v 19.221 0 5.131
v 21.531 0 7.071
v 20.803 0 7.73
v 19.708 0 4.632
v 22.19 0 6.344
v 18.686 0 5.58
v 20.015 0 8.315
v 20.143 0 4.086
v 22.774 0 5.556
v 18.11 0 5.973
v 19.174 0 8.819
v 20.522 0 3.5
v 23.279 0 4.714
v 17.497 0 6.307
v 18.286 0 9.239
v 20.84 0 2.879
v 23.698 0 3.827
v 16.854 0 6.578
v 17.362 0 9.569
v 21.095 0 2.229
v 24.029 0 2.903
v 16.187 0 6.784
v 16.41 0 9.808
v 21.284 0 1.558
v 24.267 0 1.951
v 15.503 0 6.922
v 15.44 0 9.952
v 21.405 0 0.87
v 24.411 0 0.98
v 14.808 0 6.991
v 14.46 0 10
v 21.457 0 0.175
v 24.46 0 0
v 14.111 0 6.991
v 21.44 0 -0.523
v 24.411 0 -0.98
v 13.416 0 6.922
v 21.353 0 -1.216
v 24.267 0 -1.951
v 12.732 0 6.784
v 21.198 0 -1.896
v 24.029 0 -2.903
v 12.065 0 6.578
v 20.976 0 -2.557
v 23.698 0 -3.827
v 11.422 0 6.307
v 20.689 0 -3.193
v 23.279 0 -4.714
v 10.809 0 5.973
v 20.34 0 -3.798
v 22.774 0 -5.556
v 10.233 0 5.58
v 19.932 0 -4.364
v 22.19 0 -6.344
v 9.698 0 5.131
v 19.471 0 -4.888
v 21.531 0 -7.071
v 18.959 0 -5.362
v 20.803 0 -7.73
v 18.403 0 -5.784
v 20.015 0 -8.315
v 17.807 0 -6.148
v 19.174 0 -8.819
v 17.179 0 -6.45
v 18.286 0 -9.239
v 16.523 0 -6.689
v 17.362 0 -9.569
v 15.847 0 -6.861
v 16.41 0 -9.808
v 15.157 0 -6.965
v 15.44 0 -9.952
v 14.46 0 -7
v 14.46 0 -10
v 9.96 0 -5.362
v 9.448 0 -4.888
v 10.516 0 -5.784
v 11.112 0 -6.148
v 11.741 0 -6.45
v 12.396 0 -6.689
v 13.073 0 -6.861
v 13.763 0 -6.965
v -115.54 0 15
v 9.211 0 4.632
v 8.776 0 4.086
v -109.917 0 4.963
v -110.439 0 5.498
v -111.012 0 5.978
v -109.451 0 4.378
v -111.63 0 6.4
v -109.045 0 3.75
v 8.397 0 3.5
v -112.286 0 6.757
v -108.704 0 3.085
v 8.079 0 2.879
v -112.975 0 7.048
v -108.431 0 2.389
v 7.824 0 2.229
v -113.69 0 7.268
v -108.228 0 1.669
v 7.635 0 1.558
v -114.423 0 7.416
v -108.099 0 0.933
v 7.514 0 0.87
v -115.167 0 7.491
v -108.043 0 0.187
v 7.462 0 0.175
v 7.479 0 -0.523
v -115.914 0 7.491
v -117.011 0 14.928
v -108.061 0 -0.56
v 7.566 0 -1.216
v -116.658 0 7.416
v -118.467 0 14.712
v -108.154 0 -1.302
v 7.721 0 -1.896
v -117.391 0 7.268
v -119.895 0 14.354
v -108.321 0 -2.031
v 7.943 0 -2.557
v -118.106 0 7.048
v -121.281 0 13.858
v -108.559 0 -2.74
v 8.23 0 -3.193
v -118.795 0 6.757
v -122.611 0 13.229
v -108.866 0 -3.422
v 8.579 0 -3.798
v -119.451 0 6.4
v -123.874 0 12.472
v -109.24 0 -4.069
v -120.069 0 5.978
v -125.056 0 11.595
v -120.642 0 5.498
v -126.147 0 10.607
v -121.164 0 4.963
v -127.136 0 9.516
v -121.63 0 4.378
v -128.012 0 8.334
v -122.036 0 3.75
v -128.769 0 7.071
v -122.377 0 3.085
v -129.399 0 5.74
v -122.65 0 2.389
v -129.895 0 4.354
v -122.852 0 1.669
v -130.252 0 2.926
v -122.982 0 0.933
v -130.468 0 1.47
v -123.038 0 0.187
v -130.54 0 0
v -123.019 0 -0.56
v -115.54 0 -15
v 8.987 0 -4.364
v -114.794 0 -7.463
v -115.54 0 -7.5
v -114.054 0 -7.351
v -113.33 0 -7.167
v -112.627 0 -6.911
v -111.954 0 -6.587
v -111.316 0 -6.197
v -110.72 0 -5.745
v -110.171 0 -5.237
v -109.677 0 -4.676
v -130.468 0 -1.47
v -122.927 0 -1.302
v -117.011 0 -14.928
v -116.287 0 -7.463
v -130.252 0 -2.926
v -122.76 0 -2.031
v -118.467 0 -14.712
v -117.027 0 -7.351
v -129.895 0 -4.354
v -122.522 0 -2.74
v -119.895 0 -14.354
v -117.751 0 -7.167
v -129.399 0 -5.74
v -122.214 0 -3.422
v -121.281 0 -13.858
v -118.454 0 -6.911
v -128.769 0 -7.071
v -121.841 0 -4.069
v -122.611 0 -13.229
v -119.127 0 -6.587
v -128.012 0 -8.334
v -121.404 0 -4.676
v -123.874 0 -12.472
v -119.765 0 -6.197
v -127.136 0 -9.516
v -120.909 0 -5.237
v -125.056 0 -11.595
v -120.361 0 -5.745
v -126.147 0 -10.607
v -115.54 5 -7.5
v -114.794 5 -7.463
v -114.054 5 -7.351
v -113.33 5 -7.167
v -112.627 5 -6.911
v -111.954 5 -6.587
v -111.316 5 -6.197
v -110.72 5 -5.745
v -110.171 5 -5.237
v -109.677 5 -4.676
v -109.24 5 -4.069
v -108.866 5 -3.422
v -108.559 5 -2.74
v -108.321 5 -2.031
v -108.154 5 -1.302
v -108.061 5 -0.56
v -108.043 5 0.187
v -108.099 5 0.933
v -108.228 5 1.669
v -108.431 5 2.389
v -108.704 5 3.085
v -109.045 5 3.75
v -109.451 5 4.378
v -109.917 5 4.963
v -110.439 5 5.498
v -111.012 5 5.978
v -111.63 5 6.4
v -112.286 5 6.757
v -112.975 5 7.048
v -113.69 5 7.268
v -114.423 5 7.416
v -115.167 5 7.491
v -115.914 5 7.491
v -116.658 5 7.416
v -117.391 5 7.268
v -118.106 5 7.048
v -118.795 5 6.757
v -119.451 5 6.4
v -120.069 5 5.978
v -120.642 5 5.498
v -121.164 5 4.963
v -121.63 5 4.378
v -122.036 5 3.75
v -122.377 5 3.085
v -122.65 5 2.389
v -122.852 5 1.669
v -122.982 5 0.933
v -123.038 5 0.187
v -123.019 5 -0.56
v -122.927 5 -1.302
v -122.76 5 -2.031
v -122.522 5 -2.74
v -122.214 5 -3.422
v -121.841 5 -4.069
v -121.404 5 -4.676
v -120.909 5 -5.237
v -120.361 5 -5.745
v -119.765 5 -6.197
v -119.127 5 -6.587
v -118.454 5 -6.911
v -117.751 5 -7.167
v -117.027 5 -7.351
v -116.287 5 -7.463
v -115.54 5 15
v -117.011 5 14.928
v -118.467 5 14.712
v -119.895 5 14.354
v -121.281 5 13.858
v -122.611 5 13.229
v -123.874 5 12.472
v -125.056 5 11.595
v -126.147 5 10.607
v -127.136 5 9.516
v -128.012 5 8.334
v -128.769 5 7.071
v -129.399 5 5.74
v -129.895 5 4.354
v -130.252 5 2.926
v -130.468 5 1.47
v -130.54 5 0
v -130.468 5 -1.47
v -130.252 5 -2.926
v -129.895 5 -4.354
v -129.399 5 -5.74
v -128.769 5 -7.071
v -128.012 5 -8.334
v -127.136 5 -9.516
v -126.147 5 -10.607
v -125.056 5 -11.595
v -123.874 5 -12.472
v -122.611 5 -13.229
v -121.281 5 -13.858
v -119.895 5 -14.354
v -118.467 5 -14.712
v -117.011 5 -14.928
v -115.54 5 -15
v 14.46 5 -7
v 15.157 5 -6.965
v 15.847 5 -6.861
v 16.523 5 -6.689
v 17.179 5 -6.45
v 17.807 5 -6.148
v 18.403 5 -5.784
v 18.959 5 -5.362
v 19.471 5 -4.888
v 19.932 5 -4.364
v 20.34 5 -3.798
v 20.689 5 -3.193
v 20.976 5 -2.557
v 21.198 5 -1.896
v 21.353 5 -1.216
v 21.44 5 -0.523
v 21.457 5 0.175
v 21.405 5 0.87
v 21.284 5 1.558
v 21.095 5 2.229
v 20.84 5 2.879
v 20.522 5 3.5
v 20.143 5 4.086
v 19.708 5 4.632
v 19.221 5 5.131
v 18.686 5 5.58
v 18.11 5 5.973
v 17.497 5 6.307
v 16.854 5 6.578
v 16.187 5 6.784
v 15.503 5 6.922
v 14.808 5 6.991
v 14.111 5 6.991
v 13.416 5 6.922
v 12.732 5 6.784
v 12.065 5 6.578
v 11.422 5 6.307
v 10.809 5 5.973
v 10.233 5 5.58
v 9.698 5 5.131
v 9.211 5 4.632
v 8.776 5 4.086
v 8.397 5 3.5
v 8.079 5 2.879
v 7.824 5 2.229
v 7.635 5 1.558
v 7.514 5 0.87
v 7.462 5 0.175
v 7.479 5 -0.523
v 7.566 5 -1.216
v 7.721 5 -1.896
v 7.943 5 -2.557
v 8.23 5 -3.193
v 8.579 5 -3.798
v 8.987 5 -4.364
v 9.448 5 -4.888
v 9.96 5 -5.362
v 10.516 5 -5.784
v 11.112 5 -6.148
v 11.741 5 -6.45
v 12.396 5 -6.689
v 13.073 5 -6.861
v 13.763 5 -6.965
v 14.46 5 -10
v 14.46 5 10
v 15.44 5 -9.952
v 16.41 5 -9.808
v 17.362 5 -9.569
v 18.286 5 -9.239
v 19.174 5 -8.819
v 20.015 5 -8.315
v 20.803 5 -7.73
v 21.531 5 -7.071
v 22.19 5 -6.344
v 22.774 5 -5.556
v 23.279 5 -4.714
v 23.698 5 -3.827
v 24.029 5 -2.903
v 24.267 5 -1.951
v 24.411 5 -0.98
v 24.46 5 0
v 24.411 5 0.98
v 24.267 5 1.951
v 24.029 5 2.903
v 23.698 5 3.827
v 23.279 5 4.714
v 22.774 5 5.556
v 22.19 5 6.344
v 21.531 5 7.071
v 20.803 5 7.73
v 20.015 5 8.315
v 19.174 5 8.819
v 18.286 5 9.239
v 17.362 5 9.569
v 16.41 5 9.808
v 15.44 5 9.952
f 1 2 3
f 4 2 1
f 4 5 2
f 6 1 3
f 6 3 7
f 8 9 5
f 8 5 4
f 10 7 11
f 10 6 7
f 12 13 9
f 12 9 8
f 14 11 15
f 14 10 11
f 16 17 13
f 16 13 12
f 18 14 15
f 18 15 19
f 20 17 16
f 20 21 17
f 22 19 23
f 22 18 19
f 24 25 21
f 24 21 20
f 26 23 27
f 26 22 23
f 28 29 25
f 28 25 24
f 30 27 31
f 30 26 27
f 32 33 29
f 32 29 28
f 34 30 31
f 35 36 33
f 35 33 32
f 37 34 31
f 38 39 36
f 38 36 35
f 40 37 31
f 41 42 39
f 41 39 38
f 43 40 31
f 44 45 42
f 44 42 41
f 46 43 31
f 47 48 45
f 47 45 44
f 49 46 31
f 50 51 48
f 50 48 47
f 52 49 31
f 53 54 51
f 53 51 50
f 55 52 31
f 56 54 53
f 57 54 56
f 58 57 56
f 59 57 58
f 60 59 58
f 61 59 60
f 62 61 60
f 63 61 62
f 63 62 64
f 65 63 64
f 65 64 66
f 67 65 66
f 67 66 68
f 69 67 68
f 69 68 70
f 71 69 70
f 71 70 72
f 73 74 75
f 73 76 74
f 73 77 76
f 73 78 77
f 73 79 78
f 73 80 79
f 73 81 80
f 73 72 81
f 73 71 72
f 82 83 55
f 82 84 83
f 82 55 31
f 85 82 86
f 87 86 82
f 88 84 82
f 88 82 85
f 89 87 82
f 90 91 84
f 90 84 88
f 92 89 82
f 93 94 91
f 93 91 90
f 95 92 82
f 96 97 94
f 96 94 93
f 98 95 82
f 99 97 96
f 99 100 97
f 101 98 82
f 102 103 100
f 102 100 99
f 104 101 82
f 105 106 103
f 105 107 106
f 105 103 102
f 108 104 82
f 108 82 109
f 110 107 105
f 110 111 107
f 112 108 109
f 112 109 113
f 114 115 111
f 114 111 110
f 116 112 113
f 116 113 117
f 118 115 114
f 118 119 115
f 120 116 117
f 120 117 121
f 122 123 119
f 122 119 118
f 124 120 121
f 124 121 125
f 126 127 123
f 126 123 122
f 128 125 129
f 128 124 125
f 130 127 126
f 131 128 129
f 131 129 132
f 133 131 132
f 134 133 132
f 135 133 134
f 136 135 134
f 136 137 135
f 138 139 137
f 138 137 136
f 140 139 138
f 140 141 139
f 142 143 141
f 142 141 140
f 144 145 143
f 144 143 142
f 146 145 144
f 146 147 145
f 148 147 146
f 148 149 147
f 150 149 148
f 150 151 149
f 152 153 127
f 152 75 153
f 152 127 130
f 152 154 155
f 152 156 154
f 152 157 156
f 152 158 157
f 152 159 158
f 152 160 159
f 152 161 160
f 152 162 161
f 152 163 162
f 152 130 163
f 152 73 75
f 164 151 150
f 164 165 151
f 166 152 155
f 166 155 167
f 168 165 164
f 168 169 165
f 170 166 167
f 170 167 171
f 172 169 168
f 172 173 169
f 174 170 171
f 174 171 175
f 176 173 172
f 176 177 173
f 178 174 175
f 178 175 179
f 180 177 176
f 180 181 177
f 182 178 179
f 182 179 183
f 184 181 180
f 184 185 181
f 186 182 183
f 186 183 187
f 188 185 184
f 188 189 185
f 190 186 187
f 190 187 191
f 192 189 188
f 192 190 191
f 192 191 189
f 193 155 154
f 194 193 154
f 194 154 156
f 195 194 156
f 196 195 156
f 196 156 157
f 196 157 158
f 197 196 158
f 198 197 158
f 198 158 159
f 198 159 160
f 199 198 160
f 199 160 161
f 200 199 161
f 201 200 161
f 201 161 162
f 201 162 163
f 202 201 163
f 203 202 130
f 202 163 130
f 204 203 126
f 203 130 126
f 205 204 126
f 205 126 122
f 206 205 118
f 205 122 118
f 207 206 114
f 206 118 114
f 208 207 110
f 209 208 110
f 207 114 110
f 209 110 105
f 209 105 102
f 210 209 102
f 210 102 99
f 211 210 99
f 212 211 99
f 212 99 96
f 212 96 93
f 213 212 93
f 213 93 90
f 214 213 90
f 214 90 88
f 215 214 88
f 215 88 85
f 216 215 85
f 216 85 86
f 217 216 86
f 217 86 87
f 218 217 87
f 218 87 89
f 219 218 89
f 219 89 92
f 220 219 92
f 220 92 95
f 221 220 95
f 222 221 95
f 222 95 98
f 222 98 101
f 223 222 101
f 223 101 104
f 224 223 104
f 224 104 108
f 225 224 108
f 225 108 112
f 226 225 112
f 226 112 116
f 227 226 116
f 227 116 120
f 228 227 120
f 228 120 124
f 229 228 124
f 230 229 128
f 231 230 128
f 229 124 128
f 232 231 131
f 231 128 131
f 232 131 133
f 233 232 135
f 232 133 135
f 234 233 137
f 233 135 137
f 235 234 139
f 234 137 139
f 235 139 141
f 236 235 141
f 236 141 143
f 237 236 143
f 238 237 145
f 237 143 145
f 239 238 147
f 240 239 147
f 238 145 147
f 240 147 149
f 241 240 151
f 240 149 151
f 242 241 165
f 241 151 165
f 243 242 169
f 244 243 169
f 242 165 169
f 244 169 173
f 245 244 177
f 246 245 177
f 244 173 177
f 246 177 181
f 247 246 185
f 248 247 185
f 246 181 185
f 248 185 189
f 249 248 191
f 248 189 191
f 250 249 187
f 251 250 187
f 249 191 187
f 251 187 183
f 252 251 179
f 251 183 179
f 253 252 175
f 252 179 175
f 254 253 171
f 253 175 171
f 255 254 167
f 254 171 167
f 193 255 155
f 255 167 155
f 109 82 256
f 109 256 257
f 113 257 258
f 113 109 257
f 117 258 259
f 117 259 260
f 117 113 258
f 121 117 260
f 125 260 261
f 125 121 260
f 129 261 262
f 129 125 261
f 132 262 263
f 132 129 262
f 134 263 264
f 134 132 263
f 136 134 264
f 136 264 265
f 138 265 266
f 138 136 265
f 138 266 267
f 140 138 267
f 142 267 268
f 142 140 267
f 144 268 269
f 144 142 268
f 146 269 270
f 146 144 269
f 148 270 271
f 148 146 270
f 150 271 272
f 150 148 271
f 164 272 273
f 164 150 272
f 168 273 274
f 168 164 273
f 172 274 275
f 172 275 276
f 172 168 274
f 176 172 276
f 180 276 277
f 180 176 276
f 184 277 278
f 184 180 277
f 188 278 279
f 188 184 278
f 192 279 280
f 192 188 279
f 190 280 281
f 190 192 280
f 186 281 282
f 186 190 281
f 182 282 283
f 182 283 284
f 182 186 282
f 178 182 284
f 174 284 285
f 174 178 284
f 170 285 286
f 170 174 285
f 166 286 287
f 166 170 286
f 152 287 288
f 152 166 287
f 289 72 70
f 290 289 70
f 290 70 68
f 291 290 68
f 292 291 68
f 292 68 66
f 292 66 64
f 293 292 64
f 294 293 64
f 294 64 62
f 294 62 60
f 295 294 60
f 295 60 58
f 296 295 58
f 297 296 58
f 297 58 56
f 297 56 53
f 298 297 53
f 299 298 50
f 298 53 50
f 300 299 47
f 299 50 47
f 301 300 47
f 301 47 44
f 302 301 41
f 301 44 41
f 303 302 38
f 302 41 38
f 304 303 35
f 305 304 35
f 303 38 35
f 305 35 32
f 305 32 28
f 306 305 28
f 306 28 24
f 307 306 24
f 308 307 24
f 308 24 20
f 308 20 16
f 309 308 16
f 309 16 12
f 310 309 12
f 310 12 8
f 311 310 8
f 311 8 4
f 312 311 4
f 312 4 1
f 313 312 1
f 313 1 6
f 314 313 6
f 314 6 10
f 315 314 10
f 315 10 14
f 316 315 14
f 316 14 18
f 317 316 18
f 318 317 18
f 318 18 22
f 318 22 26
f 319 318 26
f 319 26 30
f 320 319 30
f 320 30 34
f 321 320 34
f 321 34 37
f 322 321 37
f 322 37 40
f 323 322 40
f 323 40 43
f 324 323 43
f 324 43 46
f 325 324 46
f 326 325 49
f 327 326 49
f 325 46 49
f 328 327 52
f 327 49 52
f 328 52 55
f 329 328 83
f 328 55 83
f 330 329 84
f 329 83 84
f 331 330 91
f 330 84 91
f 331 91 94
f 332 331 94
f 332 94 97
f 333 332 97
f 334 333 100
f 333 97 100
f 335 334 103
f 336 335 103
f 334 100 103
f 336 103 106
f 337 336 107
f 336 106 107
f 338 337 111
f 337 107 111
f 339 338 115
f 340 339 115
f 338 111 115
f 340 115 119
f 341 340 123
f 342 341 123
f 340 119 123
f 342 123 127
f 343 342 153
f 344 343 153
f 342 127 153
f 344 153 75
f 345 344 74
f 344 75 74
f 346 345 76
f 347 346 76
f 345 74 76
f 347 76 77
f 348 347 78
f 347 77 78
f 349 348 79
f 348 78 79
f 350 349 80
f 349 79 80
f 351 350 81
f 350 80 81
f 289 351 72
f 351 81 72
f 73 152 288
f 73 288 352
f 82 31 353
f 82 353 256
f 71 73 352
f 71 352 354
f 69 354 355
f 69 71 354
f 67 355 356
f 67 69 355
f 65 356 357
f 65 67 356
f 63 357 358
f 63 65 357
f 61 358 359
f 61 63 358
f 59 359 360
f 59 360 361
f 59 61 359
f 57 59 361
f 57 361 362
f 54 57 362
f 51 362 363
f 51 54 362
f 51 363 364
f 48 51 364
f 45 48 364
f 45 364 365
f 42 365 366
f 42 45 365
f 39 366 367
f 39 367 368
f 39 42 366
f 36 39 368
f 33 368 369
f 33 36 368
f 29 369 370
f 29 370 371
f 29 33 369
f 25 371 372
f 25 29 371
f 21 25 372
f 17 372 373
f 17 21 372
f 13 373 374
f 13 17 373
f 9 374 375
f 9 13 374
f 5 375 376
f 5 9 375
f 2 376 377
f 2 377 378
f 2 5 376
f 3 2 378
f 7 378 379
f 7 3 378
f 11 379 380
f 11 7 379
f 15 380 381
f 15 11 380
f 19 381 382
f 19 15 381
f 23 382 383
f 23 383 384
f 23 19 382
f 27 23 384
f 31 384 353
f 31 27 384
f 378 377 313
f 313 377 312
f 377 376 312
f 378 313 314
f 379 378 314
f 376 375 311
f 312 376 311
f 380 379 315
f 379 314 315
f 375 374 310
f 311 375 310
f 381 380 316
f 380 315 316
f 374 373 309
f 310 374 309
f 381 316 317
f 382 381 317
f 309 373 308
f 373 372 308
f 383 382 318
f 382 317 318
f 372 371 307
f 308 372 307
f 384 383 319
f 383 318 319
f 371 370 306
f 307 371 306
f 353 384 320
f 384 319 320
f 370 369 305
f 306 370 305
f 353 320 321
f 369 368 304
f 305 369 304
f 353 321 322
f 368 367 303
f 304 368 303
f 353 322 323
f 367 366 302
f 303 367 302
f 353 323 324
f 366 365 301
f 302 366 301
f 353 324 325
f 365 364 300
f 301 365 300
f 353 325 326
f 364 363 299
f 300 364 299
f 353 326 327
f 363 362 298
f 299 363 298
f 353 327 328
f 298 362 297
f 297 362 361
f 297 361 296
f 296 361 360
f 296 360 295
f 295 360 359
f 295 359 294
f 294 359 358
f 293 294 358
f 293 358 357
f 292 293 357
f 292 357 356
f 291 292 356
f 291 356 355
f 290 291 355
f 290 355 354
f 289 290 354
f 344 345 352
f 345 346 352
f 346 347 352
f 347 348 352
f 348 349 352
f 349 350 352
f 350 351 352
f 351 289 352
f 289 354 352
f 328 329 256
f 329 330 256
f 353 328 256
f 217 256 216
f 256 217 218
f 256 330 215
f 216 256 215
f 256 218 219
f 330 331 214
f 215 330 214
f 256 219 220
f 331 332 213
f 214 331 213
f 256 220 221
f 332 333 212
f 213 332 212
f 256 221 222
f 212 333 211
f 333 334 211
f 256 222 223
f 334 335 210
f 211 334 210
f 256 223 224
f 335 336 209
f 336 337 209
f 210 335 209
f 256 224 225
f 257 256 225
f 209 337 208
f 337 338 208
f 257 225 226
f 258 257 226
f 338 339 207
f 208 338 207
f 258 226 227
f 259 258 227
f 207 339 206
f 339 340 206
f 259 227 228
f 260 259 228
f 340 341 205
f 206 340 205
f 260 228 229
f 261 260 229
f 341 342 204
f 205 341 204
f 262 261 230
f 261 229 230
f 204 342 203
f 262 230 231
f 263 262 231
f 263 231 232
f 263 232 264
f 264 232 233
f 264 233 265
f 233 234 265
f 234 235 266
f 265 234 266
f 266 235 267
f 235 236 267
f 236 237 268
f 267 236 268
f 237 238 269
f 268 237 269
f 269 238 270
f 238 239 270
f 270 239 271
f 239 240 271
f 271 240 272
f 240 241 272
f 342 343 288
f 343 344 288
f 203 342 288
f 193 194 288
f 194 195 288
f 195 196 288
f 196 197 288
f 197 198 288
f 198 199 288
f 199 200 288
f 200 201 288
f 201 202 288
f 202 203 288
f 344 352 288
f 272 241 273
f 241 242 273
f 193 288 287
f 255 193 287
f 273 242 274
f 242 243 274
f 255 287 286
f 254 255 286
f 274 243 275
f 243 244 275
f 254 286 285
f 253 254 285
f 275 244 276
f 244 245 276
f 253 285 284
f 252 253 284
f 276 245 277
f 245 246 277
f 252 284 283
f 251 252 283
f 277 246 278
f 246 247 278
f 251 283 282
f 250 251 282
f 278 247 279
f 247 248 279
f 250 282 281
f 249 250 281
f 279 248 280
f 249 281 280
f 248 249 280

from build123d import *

# Parameters (mm, degrees)
BOSS_EXTRUDE1_DEPTH = 5
SKETCH4_R           = 7
SKETCH4_R_2         = 7.5
CUT_EXTRUDE1_DEPTH  = 10


with BuildPart() as part:
    # Sketch3 → Boss-Extrude1 (new body)
    with BuildSketch(Plane(origin=(0, 0, 0), x_dir=(1, 0, 0), z_dir=(0, 1, 0))):
        with BuildLine():
            Line((-115.540454706, 15), (14.459545294, 10))
            ThreePointArc((14.459545294, 10), (24.459545294, 0), (14.459545294, -10))
            Line((14.459545294, -10), (-115.540454706, -15))
            ThreePointArc((-115.540454706, -15), (-130.540454706, 0), (-115.540454706, 15))
        make_face()
    extrude(amount=BOSS_EXTRUDE1_DEPTH)

    # Sketch4 → Cut-Extrude1 (cut)
    with BuildSketch(Plane.XZ):
        with Locations(Location((14.459545294, 0, 0), (0, 0, 270))):
            Circle(SKETCH4_R)
        with Locations(Location((-115.540454706, 0, 0), (0, 0, 270))):
            Circle(SKETCH4_R_2)
    extrude(amount=-CUT_EXTRUDE1_DEPTH, mode=Mode.SUBTRACT)


solid = part.part
